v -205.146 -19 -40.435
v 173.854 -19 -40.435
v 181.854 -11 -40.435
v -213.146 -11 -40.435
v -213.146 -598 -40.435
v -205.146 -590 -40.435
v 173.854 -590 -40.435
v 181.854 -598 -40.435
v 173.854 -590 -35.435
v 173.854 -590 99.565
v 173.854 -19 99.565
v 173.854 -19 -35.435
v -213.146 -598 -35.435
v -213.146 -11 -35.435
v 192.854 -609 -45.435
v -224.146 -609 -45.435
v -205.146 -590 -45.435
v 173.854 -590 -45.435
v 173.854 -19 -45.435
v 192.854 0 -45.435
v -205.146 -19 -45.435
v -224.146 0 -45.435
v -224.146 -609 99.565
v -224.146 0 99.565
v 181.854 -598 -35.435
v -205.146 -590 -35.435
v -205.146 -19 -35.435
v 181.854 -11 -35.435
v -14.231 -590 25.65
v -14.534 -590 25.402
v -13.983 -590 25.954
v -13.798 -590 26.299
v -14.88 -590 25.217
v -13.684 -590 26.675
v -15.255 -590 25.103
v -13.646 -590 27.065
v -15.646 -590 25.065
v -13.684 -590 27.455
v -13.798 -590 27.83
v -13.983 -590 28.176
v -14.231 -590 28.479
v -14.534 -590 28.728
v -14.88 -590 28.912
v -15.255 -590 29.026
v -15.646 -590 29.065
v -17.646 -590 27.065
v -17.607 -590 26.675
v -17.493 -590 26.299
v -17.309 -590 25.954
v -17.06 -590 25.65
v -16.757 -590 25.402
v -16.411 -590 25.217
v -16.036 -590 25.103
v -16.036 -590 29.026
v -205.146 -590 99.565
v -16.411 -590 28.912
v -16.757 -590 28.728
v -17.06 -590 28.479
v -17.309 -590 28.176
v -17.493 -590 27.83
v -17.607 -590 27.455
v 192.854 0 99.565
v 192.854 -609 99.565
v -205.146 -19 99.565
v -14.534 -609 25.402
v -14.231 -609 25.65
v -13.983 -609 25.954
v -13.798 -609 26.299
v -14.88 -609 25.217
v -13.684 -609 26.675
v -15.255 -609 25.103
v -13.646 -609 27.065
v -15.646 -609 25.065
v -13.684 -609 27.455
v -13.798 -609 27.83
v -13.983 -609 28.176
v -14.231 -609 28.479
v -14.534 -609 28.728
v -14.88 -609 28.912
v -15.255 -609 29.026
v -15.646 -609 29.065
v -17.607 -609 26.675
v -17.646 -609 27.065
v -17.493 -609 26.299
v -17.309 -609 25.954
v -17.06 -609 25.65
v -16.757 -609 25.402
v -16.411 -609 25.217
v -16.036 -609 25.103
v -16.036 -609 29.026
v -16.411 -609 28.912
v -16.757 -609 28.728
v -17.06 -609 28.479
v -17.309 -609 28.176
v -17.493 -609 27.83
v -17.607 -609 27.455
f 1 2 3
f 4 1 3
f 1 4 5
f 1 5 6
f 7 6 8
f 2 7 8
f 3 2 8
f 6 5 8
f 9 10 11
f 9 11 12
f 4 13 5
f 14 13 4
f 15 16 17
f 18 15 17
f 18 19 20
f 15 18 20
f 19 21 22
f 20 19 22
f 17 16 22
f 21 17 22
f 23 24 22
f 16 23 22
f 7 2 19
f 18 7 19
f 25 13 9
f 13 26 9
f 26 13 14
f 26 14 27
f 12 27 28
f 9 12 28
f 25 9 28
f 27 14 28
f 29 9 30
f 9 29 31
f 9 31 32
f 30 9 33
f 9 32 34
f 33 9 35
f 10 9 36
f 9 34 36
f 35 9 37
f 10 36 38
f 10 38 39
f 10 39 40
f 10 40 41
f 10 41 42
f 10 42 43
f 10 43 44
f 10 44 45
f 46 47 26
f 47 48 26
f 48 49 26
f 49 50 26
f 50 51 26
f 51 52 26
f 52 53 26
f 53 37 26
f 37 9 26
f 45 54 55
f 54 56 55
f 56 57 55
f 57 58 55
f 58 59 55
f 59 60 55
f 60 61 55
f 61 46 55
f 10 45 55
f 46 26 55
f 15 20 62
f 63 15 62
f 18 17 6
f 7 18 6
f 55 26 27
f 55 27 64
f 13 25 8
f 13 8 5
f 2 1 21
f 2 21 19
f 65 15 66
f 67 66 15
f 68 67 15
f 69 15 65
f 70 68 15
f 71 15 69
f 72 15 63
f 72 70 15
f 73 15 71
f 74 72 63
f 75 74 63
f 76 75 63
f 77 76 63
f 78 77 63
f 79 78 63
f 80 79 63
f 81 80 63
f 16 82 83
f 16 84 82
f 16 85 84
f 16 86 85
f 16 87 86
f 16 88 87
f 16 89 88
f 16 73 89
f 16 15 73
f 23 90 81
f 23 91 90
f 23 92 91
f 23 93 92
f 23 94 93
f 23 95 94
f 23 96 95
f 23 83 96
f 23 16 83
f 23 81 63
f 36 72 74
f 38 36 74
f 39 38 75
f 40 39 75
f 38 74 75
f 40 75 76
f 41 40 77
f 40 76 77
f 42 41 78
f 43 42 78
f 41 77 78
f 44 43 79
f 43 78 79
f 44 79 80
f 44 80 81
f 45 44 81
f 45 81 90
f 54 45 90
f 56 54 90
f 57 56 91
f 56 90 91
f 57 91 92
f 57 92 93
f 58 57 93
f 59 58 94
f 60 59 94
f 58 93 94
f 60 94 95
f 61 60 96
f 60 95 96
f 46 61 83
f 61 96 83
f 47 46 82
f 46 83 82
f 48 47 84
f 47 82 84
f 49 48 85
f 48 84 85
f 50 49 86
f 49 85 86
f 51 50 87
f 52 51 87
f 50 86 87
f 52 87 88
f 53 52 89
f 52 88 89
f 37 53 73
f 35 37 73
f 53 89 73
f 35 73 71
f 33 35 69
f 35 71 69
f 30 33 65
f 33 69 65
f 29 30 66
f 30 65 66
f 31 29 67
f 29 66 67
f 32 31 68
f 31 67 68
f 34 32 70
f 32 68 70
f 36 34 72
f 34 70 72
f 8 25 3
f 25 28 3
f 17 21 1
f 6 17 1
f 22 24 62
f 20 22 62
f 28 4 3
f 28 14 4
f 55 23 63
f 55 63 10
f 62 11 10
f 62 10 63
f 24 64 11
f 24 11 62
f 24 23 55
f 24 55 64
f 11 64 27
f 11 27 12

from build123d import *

# Parameters (mm, degrees)
F0_W      = 417
F0_H      = 145
F1_DEPTH  = 19
F3_DEPTH  = 590
F4_W      = 379
F4_H      = 5
F5_DEPTH  = 8
F6_W      = 19
F6_H      = 145
F7_DEPTH  = 379
F9_DEPTH  = 8
F11_DEPTH = 8
F13_DEPTH = 8
F14_R     = 2
F15_DEPTH = 19


with BuildPart() as f1:
    # F0 (on Front) → F1 (new body)
    with BuildSketch(Plane.XZ):
        with Locations((-15.645568, 27.064685)):
            Rectangle(F0_W, F0_H)
    extrude(amount=F1_DEPTH)

    # F2 (on face) → F3 (join)
    with BuildSketch(Plane.XZ.offset(19)):
        Polygon((-224.145568, 99.564685), (-224.145568, -45.435315), (-205.145568, -45.435315), (-205.145568, -40.435315), (-205.145568, -35.435315), (-205.145568, 99.564685), align=None)
        Polygon((173.854432, -40.435315), (173.854432, -45.435315), (192.854432, -45.435315), (192.854432, 99.564685), (173.854432, 99.564685), (173.854432, -35.435315), align=None)
    extrude(amount=F3_DEPTH)

    # F4 (on face) → F5 (cut)
    with BuildSketch(Plane.XZ.offset(19)):
        with Locations((-15.645568, -37.935315)):
            Rectangle(F4_W, F4_H)
    extrude(amount=-F5_DEPTH, mode=Mode.SUBTRACT)

    # F6 (on face) → F7 (join)
    with BuildSketch(Plane.YZ.offset(-205.145568)):
        with Locations((-599.5, 27.064685)):
            Rectangle(F6_W, F6_H)
    extrude(amount=F7_DEPTH)

    # F8 (on face) → F9 (cut)
    with BuildSketch(Plane(origin=(173.854432, 0, 0), x_dir=(0, -1, 0), z_dir=(-1, 0, 0))):
        Polygon((19, -35.435315), (11, -35.435315), (11, -40.435315), (19, -40.435315), (590, -40.435315), (590, -35.435315), align=None)
    extrude(amount=-F9_DEPTH, mode=Mode.SUBTRACT)

    # F10 (on face) → F11 (cut)
    with BuildSketch(Plane(origin=(0, -590, 0), x_dir=(-1, 0, 0), z_dir=(0, 1, 0))):
        Polygon((-173.854432, -35.435315), (-181.854432, -35.435315), (-181.854432, -40.435315), (-173.854432, -40.435315), (205.145568, -40.435315), (205.145568, -35.435315), align=None)
    extrude(amount=-F11_DEPTH, mode=Mode.SUBTRACT)

    # F12 (on face) → F13 (cut)
    with BuildSketch(Plane.YZ.offset(-205.145568)):
        Polygon((-590, -35.435315), (-598, -35.435315), (-598, -40.435315), (-590, -40.435315), (-19, -40.435315), (-11, -40.435315), (-11, -35.435315), (-19, -35.435315), align=None)
    extrude(amount=-F13_DEPTH, mode=Mode.SUBTRACT)

    # F14 (on face) → F15 (cut)
    with BuildSketch(Plane.XZ.offset(609)):
        with Locations((-15.645568, 27.064685)):
            Circle(F14_R)
    extrude(amount=-F15_DEPTH, mode=Mode.SUBTRACT)


solid = f1.part
